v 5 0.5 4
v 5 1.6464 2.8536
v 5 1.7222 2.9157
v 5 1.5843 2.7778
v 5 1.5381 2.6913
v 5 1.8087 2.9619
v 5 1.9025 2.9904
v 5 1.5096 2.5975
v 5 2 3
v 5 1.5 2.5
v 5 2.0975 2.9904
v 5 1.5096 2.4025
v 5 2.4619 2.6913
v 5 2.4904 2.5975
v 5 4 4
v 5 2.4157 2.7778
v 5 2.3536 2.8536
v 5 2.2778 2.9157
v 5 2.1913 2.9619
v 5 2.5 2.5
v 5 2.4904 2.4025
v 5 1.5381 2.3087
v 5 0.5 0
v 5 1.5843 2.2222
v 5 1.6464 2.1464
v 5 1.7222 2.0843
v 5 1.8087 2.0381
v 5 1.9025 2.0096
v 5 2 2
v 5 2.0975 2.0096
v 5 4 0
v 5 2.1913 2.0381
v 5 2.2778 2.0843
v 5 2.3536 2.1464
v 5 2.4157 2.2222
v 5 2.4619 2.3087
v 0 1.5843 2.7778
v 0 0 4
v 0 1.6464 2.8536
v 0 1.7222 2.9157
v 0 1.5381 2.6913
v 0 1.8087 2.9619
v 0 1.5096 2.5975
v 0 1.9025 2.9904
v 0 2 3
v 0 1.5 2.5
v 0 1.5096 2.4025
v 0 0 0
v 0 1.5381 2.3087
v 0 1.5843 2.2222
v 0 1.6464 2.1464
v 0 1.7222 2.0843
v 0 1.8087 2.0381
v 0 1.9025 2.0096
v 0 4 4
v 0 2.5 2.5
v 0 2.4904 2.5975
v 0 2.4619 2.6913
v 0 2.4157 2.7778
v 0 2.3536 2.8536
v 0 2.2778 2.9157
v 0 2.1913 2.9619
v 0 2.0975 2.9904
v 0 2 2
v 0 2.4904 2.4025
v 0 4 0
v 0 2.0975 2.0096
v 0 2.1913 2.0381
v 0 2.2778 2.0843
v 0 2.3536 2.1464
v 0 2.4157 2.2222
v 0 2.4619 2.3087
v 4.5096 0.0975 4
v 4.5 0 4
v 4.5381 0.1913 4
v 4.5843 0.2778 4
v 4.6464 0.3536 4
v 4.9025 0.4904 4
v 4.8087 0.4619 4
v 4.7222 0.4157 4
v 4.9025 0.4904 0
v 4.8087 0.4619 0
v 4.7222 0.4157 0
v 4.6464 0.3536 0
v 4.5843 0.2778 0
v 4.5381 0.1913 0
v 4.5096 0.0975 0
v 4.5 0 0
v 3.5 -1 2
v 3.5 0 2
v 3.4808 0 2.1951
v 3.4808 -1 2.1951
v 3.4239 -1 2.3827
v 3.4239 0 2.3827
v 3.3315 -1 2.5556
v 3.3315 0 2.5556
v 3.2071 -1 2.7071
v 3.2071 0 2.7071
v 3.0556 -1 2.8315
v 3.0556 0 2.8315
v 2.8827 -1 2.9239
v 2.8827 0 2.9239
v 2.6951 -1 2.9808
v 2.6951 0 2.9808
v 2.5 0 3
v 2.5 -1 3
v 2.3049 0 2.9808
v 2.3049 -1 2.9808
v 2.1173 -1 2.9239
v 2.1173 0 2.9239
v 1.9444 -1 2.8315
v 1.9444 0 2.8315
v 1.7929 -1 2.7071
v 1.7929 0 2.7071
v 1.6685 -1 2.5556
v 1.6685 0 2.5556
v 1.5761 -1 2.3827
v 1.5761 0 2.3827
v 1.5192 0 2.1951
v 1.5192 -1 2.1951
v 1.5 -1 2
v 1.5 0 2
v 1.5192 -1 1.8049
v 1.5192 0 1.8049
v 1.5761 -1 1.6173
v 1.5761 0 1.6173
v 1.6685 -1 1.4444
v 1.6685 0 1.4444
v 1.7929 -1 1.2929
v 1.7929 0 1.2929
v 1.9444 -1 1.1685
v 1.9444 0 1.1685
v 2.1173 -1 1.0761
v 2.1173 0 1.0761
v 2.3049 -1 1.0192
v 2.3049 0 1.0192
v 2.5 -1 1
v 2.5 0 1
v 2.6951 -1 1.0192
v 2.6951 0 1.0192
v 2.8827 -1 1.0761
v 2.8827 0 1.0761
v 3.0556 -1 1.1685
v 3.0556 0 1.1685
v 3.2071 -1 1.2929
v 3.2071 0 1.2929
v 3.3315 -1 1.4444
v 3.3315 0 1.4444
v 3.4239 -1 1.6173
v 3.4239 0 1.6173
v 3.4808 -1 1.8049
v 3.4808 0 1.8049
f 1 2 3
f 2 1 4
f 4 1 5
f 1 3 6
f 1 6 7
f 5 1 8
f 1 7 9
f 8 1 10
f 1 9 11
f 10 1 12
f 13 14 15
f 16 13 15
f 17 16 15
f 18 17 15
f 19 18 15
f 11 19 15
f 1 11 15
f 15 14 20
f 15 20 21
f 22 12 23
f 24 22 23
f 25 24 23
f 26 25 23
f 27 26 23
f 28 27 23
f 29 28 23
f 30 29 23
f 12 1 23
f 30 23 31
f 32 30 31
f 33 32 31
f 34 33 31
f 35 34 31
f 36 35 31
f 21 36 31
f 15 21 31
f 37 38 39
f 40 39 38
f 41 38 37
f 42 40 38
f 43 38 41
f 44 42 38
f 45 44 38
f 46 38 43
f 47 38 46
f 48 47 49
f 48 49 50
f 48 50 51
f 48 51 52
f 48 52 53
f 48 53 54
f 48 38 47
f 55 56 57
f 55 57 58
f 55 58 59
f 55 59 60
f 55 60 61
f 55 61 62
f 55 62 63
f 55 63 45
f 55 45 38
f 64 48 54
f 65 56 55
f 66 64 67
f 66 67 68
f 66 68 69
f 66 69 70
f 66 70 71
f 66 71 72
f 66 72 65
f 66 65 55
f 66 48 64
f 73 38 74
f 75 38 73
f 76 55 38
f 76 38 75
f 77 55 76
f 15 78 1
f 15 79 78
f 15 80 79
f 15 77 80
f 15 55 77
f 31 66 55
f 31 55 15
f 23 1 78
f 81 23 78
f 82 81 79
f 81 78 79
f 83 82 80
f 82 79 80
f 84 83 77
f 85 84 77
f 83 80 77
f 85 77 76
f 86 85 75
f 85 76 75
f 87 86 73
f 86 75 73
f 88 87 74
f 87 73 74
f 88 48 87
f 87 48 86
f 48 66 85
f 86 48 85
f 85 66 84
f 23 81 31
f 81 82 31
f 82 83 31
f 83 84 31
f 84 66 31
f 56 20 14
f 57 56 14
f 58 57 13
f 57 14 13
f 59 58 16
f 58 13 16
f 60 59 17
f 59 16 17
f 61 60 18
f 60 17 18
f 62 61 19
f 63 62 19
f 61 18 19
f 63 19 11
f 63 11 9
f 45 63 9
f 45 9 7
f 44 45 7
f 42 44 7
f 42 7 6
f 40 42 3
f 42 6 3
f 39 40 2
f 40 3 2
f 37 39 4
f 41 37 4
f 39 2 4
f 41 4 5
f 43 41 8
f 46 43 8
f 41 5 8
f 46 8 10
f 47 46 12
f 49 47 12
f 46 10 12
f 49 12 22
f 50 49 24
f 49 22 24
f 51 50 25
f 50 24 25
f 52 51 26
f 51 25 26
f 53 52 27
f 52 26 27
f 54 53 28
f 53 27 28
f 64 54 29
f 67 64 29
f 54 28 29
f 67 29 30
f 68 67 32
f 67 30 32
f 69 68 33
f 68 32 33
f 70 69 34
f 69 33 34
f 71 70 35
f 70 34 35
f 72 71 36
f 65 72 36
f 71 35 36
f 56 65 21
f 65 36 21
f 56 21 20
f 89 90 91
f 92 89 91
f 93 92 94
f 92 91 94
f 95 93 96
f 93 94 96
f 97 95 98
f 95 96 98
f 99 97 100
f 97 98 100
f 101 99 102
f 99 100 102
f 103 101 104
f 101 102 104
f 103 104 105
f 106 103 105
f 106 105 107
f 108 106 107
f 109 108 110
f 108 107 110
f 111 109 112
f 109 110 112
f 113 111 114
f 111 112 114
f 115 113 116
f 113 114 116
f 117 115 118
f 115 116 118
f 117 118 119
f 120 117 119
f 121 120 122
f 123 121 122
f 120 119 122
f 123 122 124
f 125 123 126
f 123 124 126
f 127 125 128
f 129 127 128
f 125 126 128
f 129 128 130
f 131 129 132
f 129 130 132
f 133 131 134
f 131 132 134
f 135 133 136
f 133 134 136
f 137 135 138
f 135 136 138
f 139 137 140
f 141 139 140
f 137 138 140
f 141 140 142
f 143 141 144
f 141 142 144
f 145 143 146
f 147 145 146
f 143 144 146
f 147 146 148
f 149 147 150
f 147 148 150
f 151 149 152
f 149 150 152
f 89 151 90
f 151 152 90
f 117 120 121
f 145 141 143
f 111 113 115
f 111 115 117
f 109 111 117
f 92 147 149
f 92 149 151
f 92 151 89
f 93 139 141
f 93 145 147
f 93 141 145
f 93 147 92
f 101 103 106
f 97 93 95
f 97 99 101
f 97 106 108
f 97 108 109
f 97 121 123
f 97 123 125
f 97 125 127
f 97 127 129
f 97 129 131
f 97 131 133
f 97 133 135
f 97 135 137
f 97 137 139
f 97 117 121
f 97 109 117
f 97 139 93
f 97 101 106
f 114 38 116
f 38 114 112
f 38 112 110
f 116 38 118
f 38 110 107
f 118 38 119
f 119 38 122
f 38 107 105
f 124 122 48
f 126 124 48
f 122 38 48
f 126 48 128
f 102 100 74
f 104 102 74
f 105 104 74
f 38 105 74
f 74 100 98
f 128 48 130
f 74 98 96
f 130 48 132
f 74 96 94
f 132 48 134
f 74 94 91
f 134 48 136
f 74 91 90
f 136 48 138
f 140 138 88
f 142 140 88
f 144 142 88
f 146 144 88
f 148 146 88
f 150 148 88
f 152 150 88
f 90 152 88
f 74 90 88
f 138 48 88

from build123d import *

# Parameters (mm, degrees)
F0_W     = 5
F0_H     = 4
F1_DEPTH = 4
F2_R     = 1
F3_DEPTH = 1
F5_DEPTH = 25
F6_R     = 0.5
F7_DEPTH = 5


with BuildPart() as f1:
    # F0 (on Top) → F1 (new body)
    with BuildSketch(Plane.XY):
        with Locations((2.5, 2)):
            Rectangle(F0_W, F0_H)
    extrude(amount=F1_DEPTH)

    # F2 (on face) → F3 (join)
    with BuildSketch(Plane.XZ):
        with Locations((2.5, 2)):
            Circle(F2_R)
    extrude(amount=F3_DEPTH)

    # F4 (on face) → F5 (cut)
    with BuildSketch(Plane.XY.offset(4)):
        with BuildLine():
            Line((5, 0), (5, 0.5))
            ThreePointArc((5, 0.5), (4.646447, 0.353553), (4.5, 0))
            Line((4.5, 0), (5, 0))
        make_face()
        with BuildLine():
            ThreePointArc((4.5, 0), (5, -0.5), (5.5, 0))
            ThreePointArc((5.5, 0), (5.353553, 0.353553), (5, 0.5))
            Line((5, 0.5), (5, 0))
            Line((5, 0), (4.5, 0))
        make_face()
    extrude(amount=-F5_DEPTH, mode=Mode.SUBTRACT)

    # F6 (on face) → F7 (cut)
    with BuildSketch(Plane.YZ.offset(5)):
        with Locations((2, 2.5)):
            Circle(F6_R)
    extrude(amount=-F7_DEPTH, mode=Mode.SUBTRACT)


solid = f1.part
